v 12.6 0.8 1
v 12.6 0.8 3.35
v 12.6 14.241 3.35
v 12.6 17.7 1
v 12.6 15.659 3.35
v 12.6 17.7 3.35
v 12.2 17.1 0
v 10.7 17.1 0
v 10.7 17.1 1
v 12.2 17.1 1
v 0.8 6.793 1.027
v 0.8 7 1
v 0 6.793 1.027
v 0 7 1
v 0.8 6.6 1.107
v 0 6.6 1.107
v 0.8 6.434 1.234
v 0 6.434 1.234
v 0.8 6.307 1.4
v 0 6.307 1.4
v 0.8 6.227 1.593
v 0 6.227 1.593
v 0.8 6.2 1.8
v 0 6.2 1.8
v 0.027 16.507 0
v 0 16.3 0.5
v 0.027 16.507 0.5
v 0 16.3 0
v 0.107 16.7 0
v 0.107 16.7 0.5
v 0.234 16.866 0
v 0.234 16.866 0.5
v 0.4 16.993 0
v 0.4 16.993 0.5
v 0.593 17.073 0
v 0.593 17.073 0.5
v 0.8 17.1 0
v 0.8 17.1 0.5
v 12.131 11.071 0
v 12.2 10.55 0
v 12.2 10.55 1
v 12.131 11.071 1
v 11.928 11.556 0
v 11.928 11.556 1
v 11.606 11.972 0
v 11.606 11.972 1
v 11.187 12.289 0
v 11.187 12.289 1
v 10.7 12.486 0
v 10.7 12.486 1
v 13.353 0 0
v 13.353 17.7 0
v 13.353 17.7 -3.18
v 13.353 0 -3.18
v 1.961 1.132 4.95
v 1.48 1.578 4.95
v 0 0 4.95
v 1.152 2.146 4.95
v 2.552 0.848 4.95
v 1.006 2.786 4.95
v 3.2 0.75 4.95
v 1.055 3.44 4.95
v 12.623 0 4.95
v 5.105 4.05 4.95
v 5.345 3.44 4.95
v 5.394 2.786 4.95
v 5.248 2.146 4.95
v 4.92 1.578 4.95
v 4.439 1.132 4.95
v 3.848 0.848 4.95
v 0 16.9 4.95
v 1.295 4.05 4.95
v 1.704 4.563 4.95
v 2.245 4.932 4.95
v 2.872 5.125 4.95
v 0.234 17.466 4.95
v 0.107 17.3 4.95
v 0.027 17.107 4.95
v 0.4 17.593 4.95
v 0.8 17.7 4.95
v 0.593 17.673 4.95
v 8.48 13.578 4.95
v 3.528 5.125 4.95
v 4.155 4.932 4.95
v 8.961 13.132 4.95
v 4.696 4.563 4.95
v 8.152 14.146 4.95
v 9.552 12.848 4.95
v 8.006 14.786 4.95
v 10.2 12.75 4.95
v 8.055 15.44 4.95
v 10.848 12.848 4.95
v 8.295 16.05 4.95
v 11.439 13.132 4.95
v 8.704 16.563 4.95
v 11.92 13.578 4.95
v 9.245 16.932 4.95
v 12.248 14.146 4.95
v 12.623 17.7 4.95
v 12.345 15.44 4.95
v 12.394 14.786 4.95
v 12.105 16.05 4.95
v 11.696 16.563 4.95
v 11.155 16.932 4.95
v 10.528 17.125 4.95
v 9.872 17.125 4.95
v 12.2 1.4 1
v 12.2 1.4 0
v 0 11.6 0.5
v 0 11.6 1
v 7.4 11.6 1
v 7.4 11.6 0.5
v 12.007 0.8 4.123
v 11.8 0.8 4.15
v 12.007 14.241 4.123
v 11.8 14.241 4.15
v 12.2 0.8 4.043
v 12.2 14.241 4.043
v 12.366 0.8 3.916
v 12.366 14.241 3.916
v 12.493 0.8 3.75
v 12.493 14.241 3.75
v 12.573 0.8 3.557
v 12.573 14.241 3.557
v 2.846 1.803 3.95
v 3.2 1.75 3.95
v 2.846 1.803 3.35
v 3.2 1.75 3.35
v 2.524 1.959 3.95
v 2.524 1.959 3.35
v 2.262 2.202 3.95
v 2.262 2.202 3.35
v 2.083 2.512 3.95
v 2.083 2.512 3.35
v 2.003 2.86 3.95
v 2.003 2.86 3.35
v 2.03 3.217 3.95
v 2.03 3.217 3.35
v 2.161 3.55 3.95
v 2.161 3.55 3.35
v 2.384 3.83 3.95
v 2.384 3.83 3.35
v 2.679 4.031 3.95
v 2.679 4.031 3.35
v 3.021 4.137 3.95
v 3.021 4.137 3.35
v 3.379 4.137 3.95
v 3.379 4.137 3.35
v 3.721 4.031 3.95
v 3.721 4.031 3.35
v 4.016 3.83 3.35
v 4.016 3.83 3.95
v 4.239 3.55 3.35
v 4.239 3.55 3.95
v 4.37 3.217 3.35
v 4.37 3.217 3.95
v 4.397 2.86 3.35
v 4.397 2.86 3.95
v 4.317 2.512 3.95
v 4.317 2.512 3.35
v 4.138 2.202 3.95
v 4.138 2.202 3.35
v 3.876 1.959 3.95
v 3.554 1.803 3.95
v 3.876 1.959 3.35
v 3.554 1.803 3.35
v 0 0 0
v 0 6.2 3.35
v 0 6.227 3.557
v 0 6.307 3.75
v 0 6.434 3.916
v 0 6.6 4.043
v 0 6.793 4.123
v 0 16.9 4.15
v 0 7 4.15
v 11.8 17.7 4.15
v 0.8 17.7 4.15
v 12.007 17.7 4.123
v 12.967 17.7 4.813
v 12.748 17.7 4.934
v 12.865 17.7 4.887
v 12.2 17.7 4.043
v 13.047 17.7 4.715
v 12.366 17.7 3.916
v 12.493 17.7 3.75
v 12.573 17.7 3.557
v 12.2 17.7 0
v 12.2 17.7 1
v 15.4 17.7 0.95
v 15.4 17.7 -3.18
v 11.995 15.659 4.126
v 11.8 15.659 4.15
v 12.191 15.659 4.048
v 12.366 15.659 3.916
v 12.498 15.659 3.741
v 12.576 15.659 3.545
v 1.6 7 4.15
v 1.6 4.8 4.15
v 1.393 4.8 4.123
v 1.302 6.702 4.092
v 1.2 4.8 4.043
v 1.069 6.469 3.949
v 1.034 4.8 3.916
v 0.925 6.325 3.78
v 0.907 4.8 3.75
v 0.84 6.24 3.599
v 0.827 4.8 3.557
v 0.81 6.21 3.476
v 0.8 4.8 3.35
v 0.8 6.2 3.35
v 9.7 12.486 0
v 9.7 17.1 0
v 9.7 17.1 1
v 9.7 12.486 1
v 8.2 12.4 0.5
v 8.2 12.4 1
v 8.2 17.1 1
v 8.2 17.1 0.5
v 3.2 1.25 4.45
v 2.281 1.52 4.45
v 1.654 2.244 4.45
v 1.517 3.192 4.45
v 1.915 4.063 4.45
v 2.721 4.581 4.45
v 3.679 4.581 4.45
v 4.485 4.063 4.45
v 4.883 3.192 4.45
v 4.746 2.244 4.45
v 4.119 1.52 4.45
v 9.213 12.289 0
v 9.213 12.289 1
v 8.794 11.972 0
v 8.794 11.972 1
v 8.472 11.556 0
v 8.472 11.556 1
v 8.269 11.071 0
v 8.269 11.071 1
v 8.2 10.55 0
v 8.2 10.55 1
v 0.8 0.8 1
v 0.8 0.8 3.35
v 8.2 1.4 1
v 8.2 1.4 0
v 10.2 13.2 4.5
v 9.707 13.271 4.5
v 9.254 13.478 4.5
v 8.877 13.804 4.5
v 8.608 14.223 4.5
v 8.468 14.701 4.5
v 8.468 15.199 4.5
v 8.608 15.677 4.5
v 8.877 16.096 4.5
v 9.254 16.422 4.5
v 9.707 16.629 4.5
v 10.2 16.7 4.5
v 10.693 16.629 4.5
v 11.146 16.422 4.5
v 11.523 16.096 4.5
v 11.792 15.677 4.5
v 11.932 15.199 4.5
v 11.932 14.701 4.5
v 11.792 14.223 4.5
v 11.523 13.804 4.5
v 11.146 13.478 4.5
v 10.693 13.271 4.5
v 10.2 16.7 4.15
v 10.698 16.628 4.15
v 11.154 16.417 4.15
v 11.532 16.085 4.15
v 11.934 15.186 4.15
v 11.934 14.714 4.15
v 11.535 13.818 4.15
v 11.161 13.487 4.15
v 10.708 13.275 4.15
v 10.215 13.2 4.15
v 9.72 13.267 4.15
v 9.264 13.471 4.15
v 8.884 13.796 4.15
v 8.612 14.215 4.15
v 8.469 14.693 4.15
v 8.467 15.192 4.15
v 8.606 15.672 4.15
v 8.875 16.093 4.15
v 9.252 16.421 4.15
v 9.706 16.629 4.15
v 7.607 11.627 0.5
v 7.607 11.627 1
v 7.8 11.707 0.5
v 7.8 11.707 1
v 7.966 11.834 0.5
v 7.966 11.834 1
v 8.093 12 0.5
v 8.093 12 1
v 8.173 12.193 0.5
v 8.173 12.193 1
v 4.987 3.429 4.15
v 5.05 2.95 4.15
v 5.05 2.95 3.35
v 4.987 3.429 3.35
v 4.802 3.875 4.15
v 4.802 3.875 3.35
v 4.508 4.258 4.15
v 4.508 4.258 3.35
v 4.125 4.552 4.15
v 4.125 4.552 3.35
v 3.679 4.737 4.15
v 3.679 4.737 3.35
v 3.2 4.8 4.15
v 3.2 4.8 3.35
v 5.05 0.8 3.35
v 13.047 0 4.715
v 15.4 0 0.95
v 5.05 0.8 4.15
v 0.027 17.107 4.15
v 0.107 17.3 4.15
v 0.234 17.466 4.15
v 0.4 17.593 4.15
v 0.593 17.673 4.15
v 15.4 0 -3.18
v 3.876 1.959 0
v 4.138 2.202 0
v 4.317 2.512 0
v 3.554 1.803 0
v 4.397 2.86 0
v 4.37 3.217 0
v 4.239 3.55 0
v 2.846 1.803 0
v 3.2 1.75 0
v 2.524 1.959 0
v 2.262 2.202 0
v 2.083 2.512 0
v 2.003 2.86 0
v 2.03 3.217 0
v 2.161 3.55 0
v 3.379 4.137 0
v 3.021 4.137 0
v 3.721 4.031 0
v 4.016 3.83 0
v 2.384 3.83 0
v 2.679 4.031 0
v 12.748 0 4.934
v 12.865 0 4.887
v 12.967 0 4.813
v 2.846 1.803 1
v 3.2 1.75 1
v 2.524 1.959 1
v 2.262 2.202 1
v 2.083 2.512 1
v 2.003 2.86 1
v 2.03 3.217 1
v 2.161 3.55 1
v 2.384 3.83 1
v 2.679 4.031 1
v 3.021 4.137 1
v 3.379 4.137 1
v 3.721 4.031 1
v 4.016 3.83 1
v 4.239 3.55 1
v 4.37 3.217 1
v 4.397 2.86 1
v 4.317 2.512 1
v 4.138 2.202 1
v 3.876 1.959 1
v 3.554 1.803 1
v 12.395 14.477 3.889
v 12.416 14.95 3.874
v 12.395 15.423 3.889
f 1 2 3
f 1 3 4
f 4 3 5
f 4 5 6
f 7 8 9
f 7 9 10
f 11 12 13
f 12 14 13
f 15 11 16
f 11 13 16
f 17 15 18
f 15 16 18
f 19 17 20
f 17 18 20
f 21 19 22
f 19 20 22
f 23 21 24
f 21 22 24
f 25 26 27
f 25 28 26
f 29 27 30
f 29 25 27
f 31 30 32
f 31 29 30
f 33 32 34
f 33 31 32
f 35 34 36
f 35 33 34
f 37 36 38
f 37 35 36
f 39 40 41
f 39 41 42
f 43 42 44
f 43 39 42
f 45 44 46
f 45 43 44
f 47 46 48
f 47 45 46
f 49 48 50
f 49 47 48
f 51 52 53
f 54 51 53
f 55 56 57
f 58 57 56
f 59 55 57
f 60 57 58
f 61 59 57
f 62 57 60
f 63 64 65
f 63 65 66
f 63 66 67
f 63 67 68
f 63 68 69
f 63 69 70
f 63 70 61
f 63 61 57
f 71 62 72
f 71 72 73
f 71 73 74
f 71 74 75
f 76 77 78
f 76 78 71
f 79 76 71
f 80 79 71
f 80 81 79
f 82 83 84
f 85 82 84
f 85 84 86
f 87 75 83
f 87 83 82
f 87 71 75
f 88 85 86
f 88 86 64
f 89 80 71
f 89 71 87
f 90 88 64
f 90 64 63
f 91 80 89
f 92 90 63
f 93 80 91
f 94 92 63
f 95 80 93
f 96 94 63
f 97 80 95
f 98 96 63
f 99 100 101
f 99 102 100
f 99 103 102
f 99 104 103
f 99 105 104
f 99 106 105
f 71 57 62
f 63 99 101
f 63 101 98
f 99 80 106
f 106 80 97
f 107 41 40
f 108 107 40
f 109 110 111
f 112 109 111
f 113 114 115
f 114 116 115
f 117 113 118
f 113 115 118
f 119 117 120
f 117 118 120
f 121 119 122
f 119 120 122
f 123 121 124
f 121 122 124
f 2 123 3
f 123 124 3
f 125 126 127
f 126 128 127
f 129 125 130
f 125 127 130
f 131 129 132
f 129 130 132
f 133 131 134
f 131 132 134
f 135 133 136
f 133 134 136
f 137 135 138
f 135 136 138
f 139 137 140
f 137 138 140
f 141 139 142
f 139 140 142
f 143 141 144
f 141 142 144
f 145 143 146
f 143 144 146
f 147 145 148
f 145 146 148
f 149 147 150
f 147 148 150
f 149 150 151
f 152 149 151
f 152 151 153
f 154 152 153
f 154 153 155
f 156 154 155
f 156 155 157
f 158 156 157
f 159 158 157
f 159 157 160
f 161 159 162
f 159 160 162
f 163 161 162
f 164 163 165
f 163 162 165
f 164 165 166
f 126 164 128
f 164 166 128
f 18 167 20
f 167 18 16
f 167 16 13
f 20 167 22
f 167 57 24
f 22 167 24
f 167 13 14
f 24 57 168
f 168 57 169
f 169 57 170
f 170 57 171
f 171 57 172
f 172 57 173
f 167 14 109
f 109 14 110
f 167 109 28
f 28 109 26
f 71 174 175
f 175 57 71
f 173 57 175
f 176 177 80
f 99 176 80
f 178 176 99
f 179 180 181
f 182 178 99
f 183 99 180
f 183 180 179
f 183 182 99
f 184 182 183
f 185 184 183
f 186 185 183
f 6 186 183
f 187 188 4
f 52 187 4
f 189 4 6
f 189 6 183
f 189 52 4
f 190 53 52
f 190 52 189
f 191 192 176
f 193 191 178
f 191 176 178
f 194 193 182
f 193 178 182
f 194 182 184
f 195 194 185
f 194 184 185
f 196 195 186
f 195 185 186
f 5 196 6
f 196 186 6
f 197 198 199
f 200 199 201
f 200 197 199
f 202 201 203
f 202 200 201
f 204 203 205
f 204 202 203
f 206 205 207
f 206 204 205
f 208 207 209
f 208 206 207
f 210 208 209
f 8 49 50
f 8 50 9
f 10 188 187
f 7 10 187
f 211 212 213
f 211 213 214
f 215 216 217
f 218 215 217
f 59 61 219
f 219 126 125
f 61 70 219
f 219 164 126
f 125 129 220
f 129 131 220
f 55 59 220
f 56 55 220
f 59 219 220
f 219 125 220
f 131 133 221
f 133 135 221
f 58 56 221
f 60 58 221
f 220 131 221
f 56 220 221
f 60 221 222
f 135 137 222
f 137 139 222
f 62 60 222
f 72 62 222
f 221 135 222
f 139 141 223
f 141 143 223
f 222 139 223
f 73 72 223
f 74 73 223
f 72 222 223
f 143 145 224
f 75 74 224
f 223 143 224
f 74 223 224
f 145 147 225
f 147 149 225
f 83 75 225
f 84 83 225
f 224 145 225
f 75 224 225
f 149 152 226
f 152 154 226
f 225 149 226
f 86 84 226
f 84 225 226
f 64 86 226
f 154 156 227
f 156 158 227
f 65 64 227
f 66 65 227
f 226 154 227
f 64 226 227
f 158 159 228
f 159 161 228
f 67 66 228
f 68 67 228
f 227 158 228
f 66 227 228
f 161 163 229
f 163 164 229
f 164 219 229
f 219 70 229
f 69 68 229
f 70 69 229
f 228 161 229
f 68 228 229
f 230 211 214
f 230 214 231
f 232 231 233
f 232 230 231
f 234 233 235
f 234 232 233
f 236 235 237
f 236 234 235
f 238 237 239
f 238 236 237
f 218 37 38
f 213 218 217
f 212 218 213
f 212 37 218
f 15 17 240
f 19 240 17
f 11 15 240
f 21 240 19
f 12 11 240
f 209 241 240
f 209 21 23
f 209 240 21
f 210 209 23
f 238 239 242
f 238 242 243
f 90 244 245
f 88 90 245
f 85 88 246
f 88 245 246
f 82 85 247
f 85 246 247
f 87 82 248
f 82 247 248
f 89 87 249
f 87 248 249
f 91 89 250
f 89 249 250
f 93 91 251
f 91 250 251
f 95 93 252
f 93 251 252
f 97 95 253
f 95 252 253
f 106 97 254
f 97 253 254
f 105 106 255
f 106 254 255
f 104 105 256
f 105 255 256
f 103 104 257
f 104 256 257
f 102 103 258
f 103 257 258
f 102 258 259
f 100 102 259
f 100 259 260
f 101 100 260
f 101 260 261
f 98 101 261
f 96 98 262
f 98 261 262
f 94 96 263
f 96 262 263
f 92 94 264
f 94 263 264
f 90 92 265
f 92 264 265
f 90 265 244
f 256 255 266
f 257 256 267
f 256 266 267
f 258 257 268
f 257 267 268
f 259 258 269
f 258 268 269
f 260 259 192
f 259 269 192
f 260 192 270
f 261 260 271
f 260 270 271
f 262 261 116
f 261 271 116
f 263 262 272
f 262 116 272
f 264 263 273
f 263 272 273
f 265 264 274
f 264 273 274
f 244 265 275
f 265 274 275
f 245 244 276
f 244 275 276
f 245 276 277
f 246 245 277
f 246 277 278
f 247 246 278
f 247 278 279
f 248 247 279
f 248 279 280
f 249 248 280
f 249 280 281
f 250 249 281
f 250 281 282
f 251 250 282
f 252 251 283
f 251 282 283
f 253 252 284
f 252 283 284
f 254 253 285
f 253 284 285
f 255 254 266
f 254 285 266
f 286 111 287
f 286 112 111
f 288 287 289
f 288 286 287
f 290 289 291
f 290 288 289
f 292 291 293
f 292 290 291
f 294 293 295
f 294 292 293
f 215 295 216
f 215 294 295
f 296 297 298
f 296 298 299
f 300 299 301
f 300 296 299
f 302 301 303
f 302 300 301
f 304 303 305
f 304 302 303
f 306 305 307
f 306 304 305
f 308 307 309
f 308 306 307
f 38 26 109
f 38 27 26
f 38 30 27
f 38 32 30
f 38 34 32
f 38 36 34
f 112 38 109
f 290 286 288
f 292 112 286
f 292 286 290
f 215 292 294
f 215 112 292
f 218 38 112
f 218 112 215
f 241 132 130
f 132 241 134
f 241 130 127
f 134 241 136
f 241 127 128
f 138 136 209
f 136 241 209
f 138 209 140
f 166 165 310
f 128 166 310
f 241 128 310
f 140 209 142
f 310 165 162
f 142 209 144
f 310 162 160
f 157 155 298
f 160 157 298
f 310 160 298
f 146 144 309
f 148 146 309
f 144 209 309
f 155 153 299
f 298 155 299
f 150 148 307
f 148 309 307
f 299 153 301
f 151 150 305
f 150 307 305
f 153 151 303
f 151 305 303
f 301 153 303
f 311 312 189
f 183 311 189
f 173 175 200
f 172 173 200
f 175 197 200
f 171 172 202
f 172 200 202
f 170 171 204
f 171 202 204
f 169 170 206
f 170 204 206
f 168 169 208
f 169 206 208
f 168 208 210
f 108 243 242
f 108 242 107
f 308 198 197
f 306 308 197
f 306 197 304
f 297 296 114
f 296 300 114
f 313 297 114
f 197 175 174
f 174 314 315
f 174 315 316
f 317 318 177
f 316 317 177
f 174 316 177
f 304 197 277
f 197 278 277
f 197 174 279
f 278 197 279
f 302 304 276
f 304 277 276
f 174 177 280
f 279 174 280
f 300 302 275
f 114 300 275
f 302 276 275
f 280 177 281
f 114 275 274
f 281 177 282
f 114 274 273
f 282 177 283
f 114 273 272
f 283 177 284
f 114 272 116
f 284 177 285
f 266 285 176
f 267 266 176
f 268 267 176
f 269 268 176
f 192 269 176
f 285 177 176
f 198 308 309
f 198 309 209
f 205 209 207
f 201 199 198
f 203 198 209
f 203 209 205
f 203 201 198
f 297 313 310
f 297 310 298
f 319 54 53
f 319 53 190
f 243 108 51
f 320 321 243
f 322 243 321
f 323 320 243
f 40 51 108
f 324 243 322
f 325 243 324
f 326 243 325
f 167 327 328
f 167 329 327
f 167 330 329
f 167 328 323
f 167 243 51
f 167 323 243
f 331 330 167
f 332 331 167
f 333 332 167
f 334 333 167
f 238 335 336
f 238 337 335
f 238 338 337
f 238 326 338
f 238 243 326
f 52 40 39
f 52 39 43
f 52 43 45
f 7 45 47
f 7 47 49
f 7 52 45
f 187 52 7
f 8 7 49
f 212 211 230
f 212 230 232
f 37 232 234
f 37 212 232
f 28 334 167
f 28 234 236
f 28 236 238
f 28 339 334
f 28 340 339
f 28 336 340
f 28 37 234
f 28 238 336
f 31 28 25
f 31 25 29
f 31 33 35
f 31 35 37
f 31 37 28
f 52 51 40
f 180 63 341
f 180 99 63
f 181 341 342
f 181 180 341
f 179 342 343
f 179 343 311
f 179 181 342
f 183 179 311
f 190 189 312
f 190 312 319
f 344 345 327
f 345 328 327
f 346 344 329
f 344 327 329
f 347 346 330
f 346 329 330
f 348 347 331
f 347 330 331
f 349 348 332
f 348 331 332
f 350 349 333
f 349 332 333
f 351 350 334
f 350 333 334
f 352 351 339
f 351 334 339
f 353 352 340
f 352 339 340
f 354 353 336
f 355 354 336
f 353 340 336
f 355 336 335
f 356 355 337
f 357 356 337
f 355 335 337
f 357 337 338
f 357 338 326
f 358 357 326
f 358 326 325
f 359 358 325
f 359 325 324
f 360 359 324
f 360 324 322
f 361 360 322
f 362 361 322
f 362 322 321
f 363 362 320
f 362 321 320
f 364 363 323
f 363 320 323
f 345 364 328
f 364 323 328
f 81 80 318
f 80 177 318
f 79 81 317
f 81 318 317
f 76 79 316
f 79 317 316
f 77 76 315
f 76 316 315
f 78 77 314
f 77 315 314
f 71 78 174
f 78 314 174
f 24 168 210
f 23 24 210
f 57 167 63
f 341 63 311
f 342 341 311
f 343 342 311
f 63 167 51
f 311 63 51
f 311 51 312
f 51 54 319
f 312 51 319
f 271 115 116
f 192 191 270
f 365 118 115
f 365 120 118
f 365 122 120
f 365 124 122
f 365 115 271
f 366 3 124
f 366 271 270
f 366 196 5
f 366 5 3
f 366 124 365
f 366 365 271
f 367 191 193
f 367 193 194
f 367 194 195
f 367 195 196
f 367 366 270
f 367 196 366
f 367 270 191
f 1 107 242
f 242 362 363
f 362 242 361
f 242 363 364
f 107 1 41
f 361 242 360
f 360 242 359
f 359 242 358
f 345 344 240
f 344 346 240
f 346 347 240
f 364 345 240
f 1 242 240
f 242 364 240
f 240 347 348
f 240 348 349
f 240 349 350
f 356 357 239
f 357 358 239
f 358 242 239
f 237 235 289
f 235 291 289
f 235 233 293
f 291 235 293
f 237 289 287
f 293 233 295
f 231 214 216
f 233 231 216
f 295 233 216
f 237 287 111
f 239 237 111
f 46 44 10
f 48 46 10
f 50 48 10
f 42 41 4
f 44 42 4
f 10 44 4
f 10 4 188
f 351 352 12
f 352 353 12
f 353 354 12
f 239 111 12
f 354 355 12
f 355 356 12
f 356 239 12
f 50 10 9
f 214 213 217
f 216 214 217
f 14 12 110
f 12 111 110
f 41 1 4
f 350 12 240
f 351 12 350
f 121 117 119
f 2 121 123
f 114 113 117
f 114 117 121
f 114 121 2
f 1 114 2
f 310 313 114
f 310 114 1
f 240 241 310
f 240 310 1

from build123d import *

# Parameters (mm, degrees)
BOSS_EXTRUDE1_DEPTH                             = 15.4
CUT_EXTRUDE2_REACH                              = 25.978
SKETCH3_W                                       = 7.5
SKETCH3_H                                       = 11.5
BOSS_EXTRUDE3_REACH                             = 25.978
SKETCH4_W                                       = 0.8
SKETCH4_H                                       = 6.2
SKETCH4_W_2                                     = 2.8
SKETCH4_H_2                                     = 17.7
SKETCH10_W                                      = 4
SKETCH10_H                                      = 1
CUT_EXTRUDE4_DEPTH                              = 16.3
BOSS_EXTRUDE4_DEPTH                             = 0.8
CSK_FOR_M2_FLAT_HEAD_MACHINE_SCREW3_D           = 2.4
CSK_FOR_M2_FLAT_HEAD_MACHINE_SCREW3_CSINK_D     = 4.4
CSK_FOR_M2_FLAT_HEAD_MACHINE_SCREW3_CSINK_ANGLE = 90
MOVE_FACE1_BY                                   = 0.6
SKETCH3_2_W                                     = 7.5
SKETCH3_2_H                                     = 11.5
BOSS_EXTRUDE6_DEPTH                             = 0.8
CHAMFER1_SIZE                                   = 2.5
CHAMFER1_SIZE2                                  = 4
SKETCH12_W                                      = 2.0475
SKETCH12_H                                      = 3.18
BOSS_EXTRUDE5_DEPTH                             = 17.7
SKETCH11_R                                      = 1.75
CUT_EXTRUDE5_DEPTH                              = 25.580050854
BOSS_EXTRUDE7_DEPTH                             = 1
SKETCH16_W                                      = 8.2
SKETCH16_H                                      = 5.5
CUT_EXTRUDE6_DEPTH                              = 0.5
FILLET5_R                                       = 0.5
FILLET6_R                                       = 0.8


with BuildPart() as part:
    # Sketch2 → Boss-Extrude1 (new body)
    with BuildSketch(Plane(origin=(0, 0, 0), x_dir=(0, 0, -1), z_dir=(1, 0, 0))):
        Polygon((0, 0), (-4.95, 0), (-4.95, 17.7), (-4.15, 17.7), (-4.15, 0.8), (-1, 0.8), (-1, 17.7), (0, 17.7), align=None)
    extrude(amount=BOSS_EXTRUDE1_DEPTH)

    # Sketch3 → Cut-Extrude2 (cut, up to next)
    with BuildSketch(Plane.XY.offset(4.95), mode=Mode.PRIVATE) as cut_extrude2_sk1:
        with Locations((3.75, 11.95)):
            Rectangle(SKETCH3_W, SKETCH3_H)
    cut_extrude2_tool1 = extrude(cut_extrude2_sk1.sketch, amount=-CUT_EXTRUDE2_REACH, mode=Mode.PRIVATE) & part.part
    add(cut_extrude2_tool1.solids().sort_by_distance((3.75, 11.95, 4.95))[0], mode=Mode.SUBTRACT)

    # Sketch4 → Boss-Extrude3 (add, up to next)
    with BuildSketch(Plane.XY.offset(4.95), mode=Mode.PRIVATE) as boss_extrude3_sk1:
        with Locations((0.4, 3.1)):
            Rectangle(SKETCH4_W, SKETCH4_H)
    boss_extrude3_tool1 = extrude(boss_extrude3_sk1.sketch, amount=-BOSS_EXTRUDE3_REACH, mode=Mode.PRIVATE) - part.part
    # Sketch4 → Boss-Extrude3 (add, up to next)
    with BuildSketch(Plane.XY.offset(4.95), mode=Mode.PRIVATE) as boss_extrude3_sk2:
        with Locations((14, 8.85)):
            Rectangle(SKETCH4_W_2, SKETCH4_H_2)
    boss_extrude3_tool2 = extrude(boss_extrude3_sk2.sketch, amount=-BOSS_EXTRUDE3_REACH, mode=Mode.PRIVATE) - part.part
    add(boss_extrude3_tool1.solids().sort_by_distance((0.4, 3.1, 4.95))[0])
    add(boss_extrude3_tool2.solids().sort_by_distance((14, 8.85, 4.95))[0])

    # Sketch10 → Cut-Extrude4 (cut)
    with BuildSketch(Plane(origin=(0, 17.7, 0), x_dir=(1, 0, 0), z_dir=(0, 1, 0))):
        with Locations((10.2, -0.5)):
            Rectangle(SKETCH10_W, SKETCH10_H)
    extrude(amount=-CUT_EXTRUDE4_DEPTH, mode=Mode.SUBTRACT)

    # Sketch6 → Boss-Extrude4 (add)
    with BuildSketch(Plane(origin=(0, 0, 4.15), x_dir=(-1, 0, 0), z_dir=(0, 0, -1))):
        with BuildLine():
            Line((-0.8, 0.8), (-5.05, 0.8))
            Line((-5.05, 0.8), (-5.05, 2.95))
            ThreePointArc((-5.05, 2.95), (-4.508147545, 4.258147545), (-3.2, 4.8))
            Line((-3.2, 4.8), (-0.8, 4.8))
            Line((-0.8, 4.8), (-0.8, 0.8))
        make_face()
    extrude(amount=BOSS_EXTRUDE4_DEPTH)

    # CSK for M2 Flat Head Machine Screw3 (through all)
    with Locations(Plane(origin=(10.2, 14.95, 4.95), x_dir=(0, 1, 0), z_dir=(0, 0, 1))):
        with Locations((0, 0), (-12, 7)):
            CounterSinkHole(CSK_FOR_M2_FLAT_HEAD_MACHINE_SCREW3_D / 2, CSK_FOR_M2_FLAT_HEAD_MACHINE_SCREW3_CSINK_D / 2, counter_sink_angle=CSK_FOR_M2_FLAT_HEAD_MACHINE_SCREW3_CSINK_ANGLE)

    # Move Face1: a face moved inward by 0.6
    extrude(part.faces().sort_by_distance((4.1, 17.7, 0.5))[0], amount=MOVE_FACE1_BY, dir=(0, -1, 0), mode=Mode.SUBTRACT)

    # Sketch3<2> → Boss-Extrude6 (add)
    with BuildSketch(Plane.XY.offset(4.95)):
        with Locations((3.75, 11.95)):
            Rectangle(SKETCH3_2_W, SKETCH3_2_H)
    extrude(amount=-BOSS_EXTRUDE6_DEPTH)

    # Chamfer1
    chamfer1_edges = [part.edges().sort_by_distance(p)[0] for p in [
        (15.4, 8.85, 4.95),
    ]]
    chamfer1_side = [part.faces().sort_by_distance(p)[0] for p in [
        (7.825575812, 8.837442419, 4.95),
    ]]
    chamfer(chamfer1_edges, length=CHAMFER1_SIZE, length2=CHAMFER1_SIZE2, reference=chamfer1_side[0])

    # Sketch12 → Boss-Extrude5 (add)
    with BuildSketch(Plane(origin=(0, 17.7, 0), x_dir=(1, 0, 0), z_dir=(0, 1, 0))):
        with Locations((14.37625, 1.59)):
            Rectangle(SKETCH12_W, SKETCH12_H)
    extrude(amount=-BOSS_EXTRUDE5_DEPTH)

    # Sketch11 → Cut-Extrude5 (cut, through all)
    with BuildSketch(Plane(origin=(0, 0, 4.15), x_dir=(-1, 0, 0), z_dir=(0, 0, -1))):
        with Locations(Location((-10.2, 14.95, 0), (0, 0, 90))):
            Circle(SKETCH11_R)
    extrude(amount=-CUT_EXTRUDE5_DEPTH, mode=Mode.SUBTRACT)

    # Sketch14 → Boss-Extrude7 (add)
    with BuildSketch(Plane(origin=(0, 0, 0), x_dir=(-1, 0, 0), z_dir=(0, 0, -1))):
        with BuildLine():
            Line((-12.2, 17.1), (-12.2, 10.55))
            ThreePointArc((-12.2, 10.55), (-11.78113883, 11.774744871), (-10.7, 12.486491673))
            Line((-10.7, 12.486491673), (-10.7, 17.1))
            Line((-10.7, 17.1), (-12.2, 17.1))
        make_face()
        with BuildLine():
            ThreePointArc((-9.7, 12.486491673), (-8.61886117, 11.774744871), (-8.2, 10.55))
            Line((-8.2, 10.55), (-8.2, 17.1))
            Line((-8.2, 17.1), (-9.7, 17.1))
            Line((-9.7, 17.1), (-9.7, 12.486491673))
        make_face()
    extrude(amount=-BOSS_EXTRUDE7_DEPTH)

    # Sketch16 → Cut-Extrude6 (cut)
    with BuildSketch(Plane.XY.offset(1)):
        with Locations((4.1, 14.35)):
            Rectangle(SKETCH16_W, SKETCH16_H)
    extrude(amount=-CUT_EXTRUDE6_DEPTH, mode=Mode.SUBTRACT)

    # Fillet5
    fillet5_edges = [part.edges().sort_by_distance(p)[0] for p in [
        (12.9, 8.85, 4.95),
    ]]
    fillet(fillet5_edges, radius=FILLET5_R)

    # Fillet6
    fillet6_edges = [part.edges().sort_by_distance(p)[0] for p in [
        (0.8, 5.5, 4.15),
        (0, 17.1, 0.25),
        (0, 17.7, 4.55),
        (0.4, 6.2, 4.15),
        (8.2, 11.6, 0.75),
        (0.4, 6.2, 1),
        (12.6, 9.25, 4.15),
    ]]
    fillet(fillet6_edges, radius=FILLET6_R)


solid = part.part
